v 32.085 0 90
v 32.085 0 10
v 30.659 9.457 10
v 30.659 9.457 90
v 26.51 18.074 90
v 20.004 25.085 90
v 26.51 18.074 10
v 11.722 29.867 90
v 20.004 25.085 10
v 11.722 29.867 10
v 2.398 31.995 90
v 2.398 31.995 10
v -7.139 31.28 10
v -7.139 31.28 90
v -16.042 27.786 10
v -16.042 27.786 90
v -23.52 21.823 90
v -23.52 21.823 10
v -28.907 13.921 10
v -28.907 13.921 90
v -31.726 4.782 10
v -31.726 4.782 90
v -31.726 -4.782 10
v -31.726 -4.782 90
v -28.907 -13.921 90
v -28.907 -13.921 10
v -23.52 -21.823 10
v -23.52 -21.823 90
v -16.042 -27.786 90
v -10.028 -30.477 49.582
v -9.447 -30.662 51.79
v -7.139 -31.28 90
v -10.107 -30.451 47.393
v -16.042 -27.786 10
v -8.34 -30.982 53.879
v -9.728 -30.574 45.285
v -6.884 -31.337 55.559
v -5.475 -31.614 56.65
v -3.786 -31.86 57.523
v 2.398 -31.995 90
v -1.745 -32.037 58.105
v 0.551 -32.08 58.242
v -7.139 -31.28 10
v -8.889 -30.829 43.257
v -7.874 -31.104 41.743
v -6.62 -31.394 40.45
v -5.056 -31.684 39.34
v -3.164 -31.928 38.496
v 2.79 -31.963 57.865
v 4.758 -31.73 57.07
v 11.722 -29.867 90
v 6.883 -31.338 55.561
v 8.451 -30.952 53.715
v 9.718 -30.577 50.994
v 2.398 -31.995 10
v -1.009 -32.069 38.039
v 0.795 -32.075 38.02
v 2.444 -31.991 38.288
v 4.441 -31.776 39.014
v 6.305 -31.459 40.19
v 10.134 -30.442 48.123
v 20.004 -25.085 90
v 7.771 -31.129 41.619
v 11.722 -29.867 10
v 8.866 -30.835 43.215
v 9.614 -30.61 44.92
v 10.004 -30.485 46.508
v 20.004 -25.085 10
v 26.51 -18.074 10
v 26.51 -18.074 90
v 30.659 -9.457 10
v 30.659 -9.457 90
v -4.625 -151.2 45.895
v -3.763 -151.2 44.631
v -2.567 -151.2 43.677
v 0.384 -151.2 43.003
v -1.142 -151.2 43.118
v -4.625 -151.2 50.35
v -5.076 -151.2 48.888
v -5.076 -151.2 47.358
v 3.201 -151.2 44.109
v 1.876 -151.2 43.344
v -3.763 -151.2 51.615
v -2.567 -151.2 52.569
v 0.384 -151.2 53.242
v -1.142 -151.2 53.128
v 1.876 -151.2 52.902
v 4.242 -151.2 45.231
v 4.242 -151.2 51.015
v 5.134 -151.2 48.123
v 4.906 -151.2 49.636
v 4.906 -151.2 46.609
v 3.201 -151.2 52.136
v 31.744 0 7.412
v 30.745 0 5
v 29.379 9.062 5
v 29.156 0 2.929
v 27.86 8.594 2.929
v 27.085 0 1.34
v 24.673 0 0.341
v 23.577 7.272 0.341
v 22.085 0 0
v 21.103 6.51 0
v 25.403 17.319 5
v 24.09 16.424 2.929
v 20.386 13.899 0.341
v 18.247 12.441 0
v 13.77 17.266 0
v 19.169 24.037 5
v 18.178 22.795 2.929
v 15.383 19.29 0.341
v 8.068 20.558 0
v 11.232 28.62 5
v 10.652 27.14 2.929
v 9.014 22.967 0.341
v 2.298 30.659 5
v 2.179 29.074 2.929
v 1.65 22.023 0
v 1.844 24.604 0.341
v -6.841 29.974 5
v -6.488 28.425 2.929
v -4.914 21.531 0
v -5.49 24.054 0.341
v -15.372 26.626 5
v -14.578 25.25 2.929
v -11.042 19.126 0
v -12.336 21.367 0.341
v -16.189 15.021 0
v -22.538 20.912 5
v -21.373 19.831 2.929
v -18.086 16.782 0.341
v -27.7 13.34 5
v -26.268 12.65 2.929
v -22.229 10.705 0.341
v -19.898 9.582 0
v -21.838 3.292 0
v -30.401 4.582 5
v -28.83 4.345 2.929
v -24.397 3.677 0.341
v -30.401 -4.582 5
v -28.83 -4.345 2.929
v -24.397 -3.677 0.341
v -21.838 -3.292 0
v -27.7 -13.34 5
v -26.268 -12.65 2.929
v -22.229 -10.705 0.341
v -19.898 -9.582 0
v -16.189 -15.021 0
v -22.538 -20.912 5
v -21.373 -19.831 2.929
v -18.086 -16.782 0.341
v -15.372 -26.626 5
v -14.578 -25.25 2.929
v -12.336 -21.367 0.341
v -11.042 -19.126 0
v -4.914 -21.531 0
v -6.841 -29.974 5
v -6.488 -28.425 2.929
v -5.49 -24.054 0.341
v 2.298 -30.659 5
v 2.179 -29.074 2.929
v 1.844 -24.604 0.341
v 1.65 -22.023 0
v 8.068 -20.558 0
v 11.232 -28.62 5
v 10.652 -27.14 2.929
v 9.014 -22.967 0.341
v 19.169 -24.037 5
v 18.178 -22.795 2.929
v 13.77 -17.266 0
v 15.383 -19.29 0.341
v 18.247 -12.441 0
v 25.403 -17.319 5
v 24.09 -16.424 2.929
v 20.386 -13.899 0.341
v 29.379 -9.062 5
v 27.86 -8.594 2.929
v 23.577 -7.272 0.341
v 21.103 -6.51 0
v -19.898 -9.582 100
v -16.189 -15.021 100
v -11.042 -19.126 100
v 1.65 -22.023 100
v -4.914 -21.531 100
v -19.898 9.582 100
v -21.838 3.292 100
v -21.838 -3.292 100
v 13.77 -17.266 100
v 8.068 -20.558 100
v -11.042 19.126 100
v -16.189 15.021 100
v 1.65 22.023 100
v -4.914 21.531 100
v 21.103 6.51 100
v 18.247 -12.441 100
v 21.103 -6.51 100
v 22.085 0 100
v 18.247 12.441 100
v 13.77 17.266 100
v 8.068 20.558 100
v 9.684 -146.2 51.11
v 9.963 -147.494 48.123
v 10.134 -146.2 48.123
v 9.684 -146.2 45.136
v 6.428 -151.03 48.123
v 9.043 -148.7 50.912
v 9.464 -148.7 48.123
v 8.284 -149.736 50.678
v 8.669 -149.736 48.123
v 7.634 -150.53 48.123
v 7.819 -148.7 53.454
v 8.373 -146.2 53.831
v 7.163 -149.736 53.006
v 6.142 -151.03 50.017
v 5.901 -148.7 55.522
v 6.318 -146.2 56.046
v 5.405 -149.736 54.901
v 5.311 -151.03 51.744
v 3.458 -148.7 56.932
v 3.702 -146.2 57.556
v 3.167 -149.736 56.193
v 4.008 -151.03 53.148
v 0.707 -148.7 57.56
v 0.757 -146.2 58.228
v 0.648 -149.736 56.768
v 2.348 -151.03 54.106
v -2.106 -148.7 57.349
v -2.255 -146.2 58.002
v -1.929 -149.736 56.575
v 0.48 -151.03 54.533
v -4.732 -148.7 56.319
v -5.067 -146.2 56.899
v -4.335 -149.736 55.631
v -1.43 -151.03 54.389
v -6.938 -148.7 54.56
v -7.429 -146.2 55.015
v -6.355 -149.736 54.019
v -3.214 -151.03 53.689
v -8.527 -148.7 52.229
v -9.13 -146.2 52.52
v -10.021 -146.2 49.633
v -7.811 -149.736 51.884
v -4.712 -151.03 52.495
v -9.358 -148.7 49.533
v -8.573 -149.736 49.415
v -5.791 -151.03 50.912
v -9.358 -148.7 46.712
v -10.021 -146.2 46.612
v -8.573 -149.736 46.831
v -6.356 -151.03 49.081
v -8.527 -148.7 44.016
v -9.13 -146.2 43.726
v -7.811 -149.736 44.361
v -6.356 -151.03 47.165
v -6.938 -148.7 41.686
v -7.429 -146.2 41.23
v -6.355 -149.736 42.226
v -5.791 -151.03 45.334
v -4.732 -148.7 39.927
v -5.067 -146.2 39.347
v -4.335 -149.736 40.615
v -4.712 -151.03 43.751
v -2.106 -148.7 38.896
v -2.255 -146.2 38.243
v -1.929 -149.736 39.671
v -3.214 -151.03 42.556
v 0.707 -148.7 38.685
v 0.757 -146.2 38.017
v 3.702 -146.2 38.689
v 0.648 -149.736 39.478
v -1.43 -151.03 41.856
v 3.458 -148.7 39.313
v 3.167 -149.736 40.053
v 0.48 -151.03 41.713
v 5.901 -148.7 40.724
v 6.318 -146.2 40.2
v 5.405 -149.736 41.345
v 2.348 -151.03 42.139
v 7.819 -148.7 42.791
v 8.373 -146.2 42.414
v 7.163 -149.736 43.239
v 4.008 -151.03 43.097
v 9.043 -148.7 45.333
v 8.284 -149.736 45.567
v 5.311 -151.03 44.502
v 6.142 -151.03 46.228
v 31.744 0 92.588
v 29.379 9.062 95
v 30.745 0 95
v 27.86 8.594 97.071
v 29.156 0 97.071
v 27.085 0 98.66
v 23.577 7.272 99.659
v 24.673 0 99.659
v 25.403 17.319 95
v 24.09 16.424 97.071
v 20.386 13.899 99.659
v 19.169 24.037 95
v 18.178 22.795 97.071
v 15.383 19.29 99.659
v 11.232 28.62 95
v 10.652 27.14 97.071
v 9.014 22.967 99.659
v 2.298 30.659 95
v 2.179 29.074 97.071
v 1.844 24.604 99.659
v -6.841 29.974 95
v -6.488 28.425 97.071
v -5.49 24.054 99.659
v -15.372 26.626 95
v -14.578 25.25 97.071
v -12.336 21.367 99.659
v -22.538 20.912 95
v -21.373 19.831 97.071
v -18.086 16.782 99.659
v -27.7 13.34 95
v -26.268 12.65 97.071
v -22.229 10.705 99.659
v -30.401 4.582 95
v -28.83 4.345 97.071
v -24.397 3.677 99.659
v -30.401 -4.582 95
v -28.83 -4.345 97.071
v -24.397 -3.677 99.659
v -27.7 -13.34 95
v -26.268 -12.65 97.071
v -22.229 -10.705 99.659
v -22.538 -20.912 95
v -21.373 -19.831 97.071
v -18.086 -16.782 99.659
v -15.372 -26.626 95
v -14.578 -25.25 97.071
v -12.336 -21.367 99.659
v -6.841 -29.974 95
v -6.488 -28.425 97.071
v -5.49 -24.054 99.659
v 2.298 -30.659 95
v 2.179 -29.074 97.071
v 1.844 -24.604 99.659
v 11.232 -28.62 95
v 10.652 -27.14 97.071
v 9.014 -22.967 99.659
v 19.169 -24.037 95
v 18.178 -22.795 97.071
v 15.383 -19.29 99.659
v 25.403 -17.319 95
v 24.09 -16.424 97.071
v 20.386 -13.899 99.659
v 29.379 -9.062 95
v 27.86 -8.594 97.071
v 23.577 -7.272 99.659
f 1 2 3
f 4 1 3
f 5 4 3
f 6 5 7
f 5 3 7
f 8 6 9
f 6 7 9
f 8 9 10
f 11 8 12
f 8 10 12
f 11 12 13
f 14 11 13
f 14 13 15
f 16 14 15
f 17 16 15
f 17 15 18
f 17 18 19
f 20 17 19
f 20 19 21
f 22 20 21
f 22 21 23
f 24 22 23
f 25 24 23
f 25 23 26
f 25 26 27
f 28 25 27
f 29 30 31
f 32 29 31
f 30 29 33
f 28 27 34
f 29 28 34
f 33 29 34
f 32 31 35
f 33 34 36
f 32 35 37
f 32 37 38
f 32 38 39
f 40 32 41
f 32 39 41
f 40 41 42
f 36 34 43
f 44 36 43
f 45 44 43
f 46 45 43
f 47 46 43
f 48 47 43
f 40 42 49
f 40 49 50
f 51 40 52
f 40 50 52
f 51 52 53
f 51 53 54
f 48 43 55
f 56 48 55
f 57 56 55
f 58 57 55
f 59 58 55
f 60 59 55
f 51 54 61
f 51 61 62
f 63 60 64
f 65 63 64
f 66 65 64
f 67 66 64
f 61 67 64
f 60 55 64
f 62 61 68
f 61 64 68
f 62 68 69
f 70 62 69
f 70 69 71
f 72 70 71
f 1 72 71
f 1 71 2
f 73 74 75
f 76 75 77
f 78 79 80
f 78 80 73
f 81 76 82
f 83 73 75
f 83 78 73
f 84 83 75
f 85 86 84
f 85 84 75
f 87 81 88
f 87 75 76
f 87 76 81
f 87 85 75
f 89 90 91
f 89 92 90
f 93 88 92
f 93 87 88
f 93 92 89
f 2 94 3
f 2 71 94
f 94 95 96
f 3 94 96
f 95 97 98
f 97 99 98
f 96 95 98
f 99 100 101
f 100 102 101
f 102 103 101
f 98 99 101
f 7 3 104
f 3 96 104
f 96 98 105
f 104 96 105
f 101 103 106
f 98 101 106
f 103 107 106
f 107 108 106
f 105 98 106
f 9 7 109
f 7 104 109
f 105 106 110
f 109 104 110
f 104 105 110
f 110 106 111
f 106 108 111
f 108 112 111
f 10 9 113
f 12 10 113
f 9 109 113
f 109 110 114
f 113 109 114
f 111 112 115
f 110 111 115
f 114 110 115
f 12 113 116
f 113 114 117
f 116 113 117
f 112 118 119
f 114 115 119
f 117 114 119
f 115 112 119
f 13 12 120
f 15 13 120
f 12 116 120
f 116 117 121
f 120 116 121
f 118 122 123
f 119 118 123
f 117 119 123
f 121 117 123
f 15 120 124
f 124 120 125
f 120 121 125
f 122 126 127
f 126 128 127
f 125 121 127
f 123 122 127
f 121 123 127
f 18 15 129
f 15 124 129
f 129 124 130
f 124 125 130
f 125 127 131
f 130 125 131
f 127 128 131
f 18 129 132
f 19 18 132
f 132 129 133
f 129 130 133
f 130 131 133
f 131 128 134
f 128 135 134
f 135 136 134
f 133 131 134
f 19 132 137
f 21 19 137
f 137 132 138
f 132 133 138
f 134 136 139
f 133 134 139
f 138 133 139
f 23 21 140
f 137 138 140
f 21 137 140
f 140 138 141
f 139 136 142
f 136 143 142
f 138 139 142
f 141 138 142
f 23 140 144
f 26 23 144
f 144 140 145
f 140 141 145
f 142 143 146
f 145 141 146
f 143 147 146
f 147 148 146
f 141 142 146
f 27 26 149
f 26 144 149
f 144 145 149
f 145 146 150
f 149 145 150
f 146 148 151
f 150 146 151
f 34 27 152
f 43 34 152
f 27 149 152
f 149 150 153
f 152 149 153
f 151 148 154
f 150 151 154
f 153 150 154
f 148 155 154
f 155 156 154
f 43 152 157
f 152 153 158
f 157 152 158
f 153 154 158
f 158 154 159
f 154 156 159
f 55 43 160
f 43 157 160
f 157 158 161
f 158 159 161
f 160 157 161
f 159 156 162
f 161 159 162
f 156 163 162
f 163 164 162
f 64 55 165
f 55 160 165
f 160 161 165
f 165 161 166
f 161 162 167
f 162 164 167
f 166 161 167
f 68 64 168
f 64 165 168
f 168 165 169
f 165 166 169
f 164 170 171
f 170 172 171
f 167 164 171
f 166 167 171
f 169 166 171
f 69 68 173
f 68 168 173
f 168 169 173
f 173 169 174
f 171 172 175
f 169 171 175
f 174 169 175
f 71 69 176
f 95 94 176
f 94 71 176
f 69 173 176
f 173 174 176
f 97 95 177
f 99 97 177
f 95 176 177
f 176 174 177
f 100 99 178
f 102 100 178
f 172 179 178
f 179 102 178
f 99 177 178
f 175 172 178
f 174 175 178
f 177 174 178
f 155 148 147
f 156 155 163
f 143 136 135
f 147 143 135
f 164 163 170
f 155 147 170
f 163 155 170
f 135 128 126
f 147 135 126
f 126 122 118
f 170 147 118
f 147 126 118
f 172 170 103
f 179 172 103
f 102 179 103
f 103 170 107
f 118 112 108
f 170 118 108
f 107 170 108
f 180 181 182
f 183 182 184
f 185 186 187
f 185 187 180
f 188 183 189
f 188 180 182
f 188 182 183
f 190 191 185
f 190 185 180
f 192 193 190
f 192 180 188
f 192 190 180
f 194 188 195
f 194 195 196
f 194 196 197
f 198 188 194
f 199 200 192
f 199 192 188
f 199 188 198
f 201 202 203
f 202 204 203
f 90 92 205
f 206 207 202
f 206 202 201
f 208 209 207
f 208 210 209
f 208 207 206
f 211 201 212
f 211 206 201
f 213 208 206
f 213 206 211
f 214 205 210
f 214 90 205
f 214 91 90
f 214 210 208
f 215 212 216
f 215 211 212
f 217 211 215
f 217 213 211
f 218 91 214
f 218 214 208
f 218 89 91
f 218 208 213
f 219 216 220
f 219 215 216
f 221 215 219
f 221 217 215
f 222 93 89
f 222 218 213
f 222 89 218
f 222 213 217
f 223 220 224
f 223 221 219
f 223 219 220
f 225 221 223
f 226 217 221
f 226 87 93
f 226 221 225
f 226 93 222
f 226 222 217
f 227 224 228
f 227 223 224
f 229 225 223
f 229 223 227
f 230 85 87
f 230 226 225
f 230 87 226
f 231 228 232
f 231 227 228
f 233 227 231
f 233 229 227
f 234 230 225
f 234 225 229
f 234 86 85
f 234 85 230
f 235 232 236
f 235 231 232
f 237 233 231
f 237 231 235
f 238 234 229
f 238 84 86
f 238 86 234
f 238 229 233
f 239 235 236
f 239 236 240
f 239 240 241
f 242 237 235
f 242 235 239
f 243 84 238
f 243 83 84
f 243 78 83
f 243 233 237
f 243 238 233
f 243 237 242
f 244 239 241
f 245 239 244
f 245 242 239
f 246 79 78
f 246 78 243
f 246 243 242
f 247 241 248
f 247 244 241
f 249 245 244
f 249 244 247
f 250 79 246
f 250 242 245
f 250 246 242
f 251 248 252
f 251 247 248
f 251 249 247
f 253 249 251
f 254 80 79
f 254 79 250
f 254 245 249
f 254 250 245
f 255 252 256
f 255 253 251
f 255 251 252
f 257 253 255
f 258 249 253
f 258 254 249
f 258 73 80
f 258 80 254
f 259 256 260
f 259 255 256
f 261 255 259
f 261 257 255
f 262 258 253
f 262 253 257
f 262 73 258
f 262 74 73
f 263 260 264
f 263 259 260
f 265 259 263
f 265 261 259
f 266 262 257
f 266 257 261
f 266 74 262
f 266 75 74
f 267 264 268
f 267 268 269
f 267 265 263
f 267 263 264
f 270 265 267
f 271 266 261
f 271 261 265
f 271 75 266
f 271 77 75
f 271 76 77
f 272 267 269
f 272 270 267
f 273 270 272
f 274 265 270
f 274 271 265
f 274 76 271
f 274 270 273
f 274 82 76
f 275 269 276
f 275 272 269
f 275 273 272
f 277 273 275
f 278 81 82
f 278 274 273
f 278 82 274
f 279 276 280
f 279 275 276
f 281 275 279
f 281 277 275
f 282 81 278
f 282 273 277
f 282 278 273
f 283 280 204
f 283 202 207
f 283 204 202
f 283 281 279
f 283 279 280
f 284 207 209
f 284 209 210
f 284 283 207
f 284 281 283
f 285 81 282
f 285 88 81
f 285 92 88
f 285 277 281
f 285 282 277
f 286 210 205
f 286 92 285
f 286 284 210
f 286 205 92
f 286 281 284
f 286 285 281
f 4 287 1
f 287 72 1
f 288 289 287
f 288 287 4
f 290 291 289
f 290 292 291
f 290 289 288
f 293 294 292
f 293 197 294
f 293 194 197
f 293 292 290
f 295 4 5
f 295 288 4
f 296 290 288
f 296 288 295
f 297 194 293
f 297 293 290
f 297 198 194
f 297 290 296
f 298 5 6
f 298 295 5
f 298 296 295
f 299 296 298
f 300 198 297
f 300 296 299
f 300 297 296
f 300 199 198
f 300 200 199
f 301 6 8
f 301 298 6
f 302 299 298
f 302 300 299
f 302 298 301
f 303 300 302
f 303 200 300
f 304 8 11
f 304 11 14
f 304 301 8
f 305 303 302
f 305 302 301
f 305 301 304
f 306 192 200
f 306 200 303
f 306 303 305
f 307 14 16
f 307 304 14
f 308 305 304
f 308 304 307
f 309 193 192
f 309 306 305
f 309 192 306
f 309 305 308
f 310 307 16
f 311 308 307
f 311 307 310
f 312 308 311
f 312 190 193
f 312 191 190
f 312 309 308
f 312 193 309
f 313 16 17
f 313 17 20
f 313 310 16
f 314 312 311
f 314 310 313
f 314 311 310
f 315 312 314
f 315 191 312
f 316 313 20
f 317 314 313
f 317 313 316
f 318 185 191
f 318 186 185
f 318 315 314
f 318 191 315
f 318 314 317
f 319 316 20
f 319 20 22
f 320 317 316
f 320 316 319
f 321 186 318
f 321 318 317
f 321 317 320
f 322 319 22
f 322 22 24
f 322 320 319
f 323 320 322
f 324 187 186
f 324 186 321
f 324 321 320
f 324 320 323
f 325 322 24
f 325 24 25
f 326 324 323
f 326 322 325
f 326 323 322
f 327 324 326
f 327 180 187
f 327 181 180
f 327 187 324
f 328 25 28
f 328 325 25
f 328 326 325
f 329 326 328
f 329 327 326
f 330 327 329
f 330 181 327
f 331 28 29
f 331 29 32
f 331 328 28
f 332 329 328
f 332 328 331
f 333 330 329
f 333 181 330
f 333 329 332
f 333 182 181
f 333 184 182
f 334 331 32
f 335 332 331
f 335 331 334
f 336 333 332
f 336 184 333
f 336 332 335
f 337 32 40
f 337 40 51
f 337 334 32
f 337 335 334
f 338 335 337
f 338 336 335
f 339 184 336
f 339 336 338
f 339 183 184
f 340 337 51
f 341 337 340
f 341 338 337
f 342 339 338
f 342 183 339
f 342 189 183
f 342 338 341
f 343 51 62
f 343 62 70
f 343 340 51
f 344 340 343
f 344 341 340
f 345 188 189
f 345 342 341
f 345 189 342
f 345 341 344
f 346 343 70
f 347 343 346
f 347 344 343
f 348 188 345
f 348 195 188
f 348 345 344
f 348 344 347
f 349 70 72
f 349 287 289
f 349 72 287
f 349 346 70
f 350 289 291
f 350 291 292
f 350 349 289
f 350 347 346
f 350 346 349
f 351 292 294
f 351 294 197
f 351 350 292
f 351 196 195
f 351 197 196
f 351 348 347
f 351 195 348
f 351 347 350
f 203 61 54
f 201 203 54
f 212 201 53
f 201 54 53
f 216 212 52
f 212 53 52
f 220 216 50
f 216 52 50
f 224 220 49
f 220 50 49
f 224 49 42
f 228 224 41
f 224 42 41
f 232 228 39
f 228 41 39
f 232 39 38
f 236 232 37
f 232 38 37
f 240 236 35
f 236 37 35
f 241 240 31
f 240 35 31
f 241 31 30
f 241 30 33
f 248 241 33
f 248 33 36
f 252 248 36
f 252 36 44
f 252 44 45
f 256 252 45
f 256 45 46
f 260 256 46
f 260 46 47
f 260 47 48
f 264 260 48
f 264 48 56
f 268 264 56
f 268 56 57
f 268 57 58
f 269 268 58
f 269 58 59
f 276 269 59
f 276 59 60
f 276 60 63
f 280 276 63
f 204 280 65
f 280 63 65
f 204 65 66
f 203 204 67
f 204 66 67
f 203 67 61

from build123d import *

# Parameters (mm, degrees)
F0_R     = 32.084597
F1_DEPTH = 100
F2_R     = 10
F4_R     = 10.133801
F5_DEPTH = 125
F6_R     = 5


with BuildPart() as f1:
    # F0 (on Top) → F1 (new body)
    with BuildSketch(Plane.XY):
        Circle(F0_R)
    extrude(amount=F1_DEPTH)

    # F2
    f2_edges = [f1.edges().sort_by_distance(p)[0] for p in [
        (-32.084597, 0, 100),
        (-32.084597, 0, 0),
    ]]
    fillet(f2_edges, radius=F2_R)

    # F4 (on offset) → F5 (join)
    with BuildSketch(Plane.XZ.offset(26.2)):
        with Locations((0, 48.1227)):
            Circle(F4_R)
    extrude(amount=F5_DEPTH)

    # F6
    f6_edges = [f1.edges().sort_by_distance(p)[0] for p in [
        (-10.133801, -151.2, 48.1227),
    ]]
    fillet(f6_edges, radius=F6_R)


solid = f1.part
